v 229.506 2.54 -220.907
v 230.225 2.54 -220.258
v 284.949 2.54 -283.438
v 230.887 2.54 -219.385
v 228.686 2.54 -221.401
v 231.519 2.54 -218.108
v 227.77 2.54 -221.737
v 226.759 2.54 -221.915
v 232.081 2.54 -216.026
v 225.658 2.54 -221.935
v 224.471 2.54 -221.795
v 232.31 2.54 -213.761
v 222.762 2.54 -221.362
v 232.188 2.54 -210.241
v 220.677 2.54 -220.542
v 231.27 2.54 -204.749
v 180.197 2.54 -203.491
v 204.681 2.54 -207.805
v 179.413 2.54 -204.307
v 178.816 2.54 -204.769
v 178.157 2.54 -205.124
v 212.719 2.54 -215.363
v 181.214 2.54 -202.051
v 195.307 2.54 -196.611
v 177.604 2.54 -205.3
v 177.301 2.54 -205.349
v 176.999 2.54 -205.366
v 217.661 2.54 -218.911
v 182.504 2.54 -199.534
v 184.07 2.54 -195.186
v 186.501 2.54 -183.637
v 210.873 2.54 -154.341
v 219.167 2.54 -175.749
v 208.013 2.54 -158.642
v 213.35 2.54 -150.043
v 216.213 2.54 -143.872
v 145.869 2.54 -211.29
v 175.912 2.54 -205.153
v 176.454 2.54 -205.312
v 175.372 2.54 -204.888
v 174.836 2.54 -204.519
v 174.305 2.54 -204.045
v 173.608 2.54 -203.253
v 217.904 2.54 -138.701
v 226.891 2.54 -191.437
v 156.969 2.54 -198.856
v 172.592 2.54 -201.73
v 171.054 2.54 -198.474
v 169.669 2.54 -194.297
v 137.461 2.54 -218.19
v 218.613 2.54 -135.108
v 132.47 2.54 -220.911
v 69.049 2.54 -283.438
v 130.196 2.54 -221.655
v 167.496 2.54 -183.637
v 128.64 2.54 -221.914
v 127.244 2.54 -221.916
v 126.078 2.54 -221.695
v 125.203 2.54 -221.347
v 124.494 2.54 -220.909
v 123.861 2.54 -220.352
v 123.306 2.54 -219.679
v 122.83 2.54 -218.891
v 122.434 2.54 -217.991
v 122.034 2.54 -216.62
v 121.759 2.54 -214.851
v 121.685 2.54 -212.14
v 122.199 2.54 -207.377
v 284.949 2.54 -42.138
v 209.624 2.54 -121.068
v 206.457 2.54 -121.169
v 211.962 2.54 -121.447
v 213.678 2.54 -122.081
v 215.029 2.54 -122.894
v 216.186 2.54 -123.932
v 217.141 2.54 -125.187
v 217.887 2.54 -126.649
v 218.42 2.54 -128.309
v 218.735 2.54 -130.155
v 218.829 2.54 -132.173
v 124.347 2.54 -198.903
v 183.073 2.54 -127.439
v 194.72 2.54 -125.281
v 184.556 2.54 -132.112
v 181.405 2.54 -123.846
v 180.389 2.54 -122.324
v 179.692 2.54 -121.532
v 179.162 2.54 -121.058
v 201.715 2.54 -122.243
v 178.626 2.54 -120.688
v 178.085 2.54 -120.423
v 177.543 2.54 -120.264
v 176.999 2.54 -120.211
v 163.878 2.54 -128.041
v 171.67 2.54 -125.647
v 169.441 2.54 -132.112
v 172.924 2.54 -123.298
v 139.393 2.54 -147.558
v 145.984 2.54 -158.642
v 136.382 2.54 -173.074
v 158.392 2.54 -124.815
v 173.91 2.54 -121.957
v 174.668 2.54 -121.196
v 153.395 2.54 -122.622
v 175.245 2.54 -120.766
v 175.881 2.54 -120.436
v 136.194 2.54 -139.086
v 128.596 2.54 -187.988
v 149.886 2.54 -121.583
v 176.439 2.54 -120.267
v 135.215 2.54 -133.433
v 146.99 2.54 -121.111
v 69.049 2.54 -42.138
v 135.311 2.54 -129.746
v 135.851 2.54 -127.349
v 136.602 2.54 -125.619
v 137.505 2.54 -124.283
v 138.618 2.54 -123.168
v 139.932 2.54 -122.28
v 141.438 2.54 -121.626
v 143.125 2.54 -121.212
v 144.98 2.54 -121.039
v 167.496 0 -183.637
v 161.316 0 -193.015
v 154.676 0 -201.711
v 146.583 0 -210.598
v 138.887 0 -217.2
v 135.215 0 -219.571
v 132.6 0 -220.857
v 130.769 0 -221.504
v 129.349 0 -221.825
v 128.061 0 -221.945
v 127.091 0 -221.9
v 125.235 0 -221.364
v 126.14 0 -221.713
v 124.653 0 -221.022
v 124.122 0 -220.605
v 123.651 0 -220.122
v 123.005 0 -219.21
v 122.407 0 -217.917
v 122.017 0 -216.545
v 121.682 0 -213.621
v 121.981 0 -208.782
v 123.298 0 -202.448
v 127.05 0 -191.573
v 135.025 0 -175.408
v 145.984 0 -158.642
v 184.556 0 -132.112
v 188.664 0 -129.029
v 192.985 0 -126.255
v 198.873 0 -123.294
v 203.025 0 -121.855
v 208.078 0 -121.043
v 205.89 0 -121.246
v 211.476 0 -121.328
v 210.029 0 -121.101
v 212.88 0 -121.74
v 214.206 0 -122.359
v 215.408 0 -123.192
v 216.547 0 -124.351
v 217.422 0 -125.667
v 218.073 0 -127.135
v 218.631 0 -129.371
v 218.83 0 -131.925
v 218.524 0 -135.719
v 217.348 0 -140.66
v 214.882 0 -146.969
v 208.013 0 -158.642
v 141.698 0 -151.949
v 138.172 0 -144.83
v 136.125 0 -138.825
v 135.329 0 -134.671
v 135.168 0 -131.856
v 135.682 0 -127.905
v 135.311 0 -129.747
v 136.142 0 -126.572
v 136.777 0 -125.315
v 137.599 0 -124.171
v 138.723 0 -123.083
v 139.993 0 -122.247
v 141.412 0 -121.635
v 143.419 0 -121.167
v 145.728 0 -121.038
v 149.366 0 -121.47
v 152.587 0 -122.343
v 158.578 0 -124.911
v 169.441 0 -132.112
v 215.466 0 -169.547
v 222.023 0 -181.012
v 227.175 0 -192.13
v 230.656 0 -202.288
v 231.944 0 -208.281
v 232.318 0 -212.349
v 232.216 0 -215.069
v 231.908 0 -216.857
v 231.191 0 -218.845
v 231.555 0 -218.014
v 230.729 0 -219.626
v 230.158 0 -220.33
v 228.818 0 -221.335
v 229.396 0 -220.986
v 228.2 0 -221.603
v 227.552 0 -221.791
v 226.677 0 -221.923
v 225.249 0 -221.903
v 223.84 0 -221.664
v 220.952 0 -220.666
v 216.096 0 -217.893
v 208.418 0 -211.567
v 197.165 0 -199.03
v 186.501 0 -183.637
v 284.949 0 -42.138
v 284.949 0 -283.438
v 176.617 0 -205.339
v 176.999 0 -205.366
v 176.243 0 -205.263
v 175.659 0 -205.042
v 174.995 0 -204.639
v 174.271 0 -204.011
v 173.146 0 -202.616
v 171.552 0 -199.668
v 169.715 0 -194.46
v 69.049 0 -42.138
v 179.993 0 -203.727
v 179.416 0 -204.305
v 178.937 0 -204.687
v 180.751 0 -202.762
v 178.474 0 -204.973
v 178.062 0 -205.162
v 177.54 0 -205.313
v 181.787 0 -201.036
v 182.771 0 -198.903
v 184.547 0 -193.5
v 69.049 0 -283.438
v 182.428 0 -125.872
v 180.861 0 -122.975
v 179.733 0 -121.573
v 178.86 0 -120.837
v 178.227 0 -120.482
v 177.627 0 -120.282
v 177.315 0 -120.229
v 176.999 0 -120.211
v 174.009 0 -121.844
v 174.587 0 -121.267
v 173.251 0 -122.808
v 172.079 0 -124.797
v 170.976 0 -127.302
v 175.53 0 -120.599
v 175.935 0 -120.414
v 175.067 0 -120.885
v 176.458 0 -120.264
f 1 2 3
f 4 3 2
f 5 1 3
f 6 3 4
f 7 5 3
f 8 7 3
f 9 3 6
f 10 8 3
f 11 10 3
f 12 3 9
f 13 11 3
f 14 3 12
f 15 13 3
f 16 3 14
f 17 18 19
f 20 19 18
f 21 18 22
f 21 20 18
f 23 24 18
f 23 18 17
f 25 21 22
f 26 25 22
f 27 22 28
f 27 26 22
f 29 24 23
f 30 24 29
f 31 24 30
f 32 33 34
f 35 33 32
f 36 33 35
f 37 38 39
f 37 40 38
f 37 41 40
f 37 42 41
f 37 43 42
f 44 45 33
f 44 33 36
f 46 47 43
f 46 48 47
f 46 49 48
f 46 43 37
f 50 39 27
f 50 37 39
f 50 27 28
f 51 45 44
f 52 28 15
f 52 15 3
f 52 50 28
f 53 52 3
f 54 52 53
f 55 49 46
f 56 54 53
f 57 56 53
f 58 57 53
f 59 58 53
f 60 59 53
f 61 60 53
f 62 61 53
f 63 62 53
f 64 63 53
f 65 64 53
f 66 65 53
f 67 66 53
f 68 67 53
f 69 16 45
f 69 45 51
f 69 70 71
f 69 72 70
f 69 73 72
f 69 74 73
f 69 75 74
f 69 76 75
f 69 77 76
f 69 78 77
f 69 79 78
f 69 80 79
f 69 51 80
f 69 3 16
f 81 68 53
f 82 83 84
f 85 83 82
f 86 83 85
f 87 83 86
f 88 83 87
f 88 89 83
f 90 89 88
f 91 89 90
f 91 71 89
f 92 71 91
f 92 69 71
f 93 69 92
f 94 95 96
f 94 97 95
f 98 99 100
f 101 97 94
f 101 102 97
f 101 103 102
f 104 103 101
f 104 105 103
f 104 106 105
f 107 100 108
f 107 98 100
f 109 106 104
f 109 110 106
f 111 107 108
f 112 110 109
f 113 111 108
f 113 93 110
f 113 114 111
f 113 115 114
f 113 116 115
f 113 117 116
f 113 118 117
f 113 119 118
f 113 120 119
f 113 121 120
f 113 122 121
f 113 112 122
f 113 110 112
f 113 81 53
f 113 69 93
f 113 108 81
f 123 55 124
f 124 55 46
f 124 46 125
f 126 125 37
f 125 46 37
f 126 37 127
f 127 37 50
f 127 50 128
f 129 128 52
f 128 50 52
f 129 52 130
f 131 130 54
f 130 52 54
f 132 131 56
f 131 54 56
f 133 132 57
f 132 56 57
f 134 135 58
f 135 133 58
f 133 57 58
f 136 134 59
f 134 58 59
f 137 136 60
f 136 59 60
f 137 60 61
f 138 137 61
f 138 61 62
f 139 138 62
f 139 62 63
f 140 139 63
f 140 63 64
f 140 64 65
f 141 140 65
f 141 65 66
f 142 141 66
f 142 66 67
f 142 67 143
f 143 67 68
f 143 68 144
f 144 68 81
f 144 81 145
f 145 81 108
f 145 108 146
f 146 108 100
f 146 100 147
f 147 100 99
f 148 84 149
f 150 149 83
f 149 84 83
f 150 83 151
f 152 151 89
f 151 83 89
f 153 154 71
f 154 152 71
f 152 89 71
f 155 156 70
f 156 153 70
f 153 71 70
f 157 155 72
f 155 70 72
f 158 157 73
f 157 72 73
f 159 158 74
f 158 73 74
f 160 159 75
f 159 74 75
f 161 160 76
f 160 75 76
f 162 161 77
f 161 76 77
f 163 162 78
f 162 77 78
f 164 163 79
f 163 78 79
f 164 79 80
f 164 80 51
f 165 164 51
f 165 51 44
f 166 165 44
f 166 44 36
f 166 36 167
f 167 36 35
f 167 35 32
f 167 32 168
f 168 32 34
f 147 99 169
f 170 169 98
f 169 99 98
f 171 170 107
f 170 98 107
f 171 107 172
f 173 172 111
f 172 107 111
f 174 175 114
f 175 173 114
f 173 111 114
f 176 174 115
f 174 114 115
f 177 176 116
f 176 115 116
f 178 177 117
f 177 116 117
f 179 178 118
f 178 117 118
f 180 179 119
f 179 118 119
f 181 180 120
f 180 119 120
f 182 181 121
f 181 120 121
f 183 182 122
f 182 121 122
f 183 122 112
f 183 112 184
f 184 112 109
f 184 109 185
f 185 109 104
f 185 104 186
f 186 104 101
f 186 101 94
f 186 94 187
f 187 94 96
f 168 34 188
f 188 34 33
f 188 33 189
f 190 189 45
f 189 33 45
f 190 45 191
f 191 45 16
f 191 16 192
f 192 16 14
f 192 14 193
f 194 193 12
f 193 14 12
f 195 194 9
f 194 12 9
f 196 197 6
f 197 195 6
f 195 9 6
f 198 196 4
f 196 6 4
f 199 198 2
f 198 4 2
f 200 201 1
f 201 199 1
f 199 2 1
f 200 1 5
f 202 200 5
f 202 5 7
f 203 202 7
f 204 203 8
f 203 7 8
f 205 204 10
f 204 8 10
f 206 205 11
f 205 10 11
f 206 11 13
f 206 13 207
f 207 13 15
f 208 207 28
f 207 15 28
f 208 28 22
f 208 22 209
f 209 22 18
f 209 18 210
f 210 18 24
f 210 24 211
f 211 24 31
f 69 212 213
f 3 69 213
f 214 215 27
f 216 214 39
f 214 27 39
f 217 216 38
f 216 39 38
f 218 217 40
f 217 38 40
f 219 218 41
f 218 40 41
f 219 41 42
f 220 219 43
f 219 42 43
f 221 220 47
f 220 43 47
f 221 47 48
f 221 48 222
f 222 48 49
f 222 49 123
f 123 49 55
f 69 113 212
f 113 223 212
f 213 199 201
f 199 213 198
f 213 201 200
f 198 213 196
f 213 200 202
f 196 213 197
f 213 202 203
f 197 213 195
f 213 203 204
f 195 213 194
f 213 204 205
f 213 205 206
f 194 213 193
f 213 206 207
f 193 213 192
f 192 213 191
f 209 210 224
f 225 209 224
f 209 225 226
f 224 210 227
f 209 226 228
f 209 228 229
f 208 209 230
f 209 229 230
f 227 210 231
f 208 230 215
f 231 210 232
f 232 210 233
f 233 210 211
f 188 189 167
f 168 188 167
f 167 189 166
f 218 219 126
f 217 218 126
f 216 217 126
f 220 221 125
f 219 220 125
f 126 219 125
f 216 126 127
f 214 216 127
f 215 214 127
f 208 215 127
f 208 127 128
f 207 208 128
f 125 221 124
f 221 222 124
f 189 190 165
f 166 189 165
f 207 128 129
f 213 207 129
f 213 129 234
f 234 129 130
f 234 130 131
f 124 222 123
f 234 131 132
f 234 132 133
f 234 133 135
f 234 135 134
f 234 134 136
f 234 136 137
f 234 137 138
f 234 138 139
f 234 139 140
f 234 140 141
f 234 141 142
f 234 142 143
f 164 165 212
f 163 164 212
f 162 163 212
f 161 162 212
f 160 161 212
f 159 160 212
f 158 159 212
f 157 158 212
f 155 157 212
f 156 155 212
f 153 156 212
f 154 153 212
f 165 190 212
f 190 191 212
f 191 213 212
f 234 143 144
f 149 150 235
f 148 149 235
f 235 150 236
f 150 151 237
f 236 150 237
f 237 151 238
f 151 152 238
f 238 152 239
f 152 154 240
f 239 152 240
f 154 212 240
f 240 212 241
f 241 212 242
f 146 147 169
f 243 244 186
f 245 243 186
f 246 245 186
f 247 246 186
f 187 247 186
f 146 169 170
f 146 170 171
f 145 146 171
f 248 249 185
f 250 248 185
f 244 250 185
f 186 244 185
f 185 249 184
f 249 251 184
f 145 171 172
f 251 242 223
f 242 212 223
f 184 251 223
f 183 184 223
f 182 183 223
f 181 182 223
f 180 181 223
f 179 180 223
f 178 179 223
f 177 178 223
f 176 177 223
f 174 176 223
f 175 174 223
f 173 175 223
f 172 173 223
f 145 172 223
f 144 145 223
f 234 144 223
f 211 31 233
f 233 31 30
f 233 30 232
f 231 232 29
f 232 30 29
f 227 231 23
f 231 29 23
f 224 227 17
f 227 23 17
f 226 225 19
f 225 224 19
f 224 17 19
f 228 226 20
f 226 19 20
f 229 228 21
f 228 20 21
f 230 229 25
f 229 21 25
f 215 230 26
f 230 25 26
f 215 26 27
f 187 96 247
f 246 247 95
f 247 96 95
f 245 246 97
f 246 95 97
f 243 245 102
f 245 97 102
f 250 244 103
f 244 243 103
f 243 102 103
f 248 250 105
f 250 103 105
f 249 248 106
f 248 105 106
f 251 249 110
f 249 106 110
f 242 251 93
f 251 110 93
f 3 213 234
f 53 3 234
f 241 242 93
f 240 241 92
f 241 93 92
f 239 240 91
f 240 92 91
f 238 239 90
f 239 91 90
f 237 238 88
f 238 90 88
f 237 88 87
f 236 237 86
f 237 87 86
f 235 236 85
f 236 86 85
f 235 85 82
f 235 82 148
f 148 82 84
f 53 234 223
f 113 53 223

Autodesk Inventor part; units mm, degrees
ref_plane "YZ Plane" through (0, 0, 0) normal (1, 0, 0) x (0, 1, 0)
ref_plane "XZ Plane" through (0, 0, 0) normal (0, 1, 0) x (-1, 0, 0)
ref_plane "XY Plane" through (0, 0, 0) normal (0, 0, 1) x (1, 0, 0)
sketch "Sketch1" plane through (0, 0, 0) normal (0, 1, 0) x (-1, 0, 0)
  line L0 (-69.0486, -42.1383) -> (-284.9486, -42.1383)
  line L1 (-284.9486, -42.1383) -> (-284.9486, -283.4383)
  line L2 (-284.9486, -283.4383) -> (-69.0486, -283.4383)
  line L3 (-69.0486, -283.4383) -> (-69.0486, -42.1383)
  point P0 (0, 0)
  dimension "d0" = 215.9
  dimension "d1" = 241.3
extrude "Extrusion1" add sketch "Sketch1" along normal blind 2.54
sketch "Sketch5" plane through (0, 2.54, 0) normal (0, 1, 0) x (1, 0, 0)
  ellipse E0 centre (201.451, 177.3473) end of major axis (229.2052, 221.1135) minor radius 16.0156 (208.013, 158.6416) -> (186.5008, 183.6371) ccw
  ellipse E1 centre (187.6899, 154.5313) end of major axis (215.633, 123.3862) minor radius 18.4642 (184.5561, 132.1117) -> (208.013, 158.6416) ccw
  ellipse E2 centre (176.9986, 162.7883) end of major axis (176.9986, 205.3655) minor radius 10.8982 (186.5008, 183.6371) -> (176.9986, 205.3655) ccw
  ellipse E3 centre (176.9986, 162.7883) end of major axis (176.9986, 205.3655) minor radius 10.8982 (176.9986, 120.211) -> (184.5561, 132.1117) ccw
  ellipse E4 centre (152.5463, 177.3473) end of major axis (124.7921, 221.1135) minor radius 16.0156 (167.4964, 183.6371) -> (145.9843, 158.6416) ccw
  ellipse E5 centre (166.3073, 154.5313) end of major axis (138.3642, 123.3862) minor radius 18.4642 (145.9843, 158.6416) -> (169.4411, 132.1117) ccw
  ellipse E6 centre (176.9986, 162.7883) end of major axis (176.9986, 205.3655) minor radius 10.8982 (176.9986, 205.3655) -> (167.4964, 183.6371) ccw
  ellipse E7 centre (176.9986, 162.7883) end of major axis (176.9986, 205.3655) minor radius 10.8982 (169.4411, 132.1117) -> (176.9986, 120.211) ccw
  point P0 (0, 0)
extrude "Extrusion5" cut sketch "Sketch5" against normal through all
properties part number "Butterfly Effect Logo Plate"
